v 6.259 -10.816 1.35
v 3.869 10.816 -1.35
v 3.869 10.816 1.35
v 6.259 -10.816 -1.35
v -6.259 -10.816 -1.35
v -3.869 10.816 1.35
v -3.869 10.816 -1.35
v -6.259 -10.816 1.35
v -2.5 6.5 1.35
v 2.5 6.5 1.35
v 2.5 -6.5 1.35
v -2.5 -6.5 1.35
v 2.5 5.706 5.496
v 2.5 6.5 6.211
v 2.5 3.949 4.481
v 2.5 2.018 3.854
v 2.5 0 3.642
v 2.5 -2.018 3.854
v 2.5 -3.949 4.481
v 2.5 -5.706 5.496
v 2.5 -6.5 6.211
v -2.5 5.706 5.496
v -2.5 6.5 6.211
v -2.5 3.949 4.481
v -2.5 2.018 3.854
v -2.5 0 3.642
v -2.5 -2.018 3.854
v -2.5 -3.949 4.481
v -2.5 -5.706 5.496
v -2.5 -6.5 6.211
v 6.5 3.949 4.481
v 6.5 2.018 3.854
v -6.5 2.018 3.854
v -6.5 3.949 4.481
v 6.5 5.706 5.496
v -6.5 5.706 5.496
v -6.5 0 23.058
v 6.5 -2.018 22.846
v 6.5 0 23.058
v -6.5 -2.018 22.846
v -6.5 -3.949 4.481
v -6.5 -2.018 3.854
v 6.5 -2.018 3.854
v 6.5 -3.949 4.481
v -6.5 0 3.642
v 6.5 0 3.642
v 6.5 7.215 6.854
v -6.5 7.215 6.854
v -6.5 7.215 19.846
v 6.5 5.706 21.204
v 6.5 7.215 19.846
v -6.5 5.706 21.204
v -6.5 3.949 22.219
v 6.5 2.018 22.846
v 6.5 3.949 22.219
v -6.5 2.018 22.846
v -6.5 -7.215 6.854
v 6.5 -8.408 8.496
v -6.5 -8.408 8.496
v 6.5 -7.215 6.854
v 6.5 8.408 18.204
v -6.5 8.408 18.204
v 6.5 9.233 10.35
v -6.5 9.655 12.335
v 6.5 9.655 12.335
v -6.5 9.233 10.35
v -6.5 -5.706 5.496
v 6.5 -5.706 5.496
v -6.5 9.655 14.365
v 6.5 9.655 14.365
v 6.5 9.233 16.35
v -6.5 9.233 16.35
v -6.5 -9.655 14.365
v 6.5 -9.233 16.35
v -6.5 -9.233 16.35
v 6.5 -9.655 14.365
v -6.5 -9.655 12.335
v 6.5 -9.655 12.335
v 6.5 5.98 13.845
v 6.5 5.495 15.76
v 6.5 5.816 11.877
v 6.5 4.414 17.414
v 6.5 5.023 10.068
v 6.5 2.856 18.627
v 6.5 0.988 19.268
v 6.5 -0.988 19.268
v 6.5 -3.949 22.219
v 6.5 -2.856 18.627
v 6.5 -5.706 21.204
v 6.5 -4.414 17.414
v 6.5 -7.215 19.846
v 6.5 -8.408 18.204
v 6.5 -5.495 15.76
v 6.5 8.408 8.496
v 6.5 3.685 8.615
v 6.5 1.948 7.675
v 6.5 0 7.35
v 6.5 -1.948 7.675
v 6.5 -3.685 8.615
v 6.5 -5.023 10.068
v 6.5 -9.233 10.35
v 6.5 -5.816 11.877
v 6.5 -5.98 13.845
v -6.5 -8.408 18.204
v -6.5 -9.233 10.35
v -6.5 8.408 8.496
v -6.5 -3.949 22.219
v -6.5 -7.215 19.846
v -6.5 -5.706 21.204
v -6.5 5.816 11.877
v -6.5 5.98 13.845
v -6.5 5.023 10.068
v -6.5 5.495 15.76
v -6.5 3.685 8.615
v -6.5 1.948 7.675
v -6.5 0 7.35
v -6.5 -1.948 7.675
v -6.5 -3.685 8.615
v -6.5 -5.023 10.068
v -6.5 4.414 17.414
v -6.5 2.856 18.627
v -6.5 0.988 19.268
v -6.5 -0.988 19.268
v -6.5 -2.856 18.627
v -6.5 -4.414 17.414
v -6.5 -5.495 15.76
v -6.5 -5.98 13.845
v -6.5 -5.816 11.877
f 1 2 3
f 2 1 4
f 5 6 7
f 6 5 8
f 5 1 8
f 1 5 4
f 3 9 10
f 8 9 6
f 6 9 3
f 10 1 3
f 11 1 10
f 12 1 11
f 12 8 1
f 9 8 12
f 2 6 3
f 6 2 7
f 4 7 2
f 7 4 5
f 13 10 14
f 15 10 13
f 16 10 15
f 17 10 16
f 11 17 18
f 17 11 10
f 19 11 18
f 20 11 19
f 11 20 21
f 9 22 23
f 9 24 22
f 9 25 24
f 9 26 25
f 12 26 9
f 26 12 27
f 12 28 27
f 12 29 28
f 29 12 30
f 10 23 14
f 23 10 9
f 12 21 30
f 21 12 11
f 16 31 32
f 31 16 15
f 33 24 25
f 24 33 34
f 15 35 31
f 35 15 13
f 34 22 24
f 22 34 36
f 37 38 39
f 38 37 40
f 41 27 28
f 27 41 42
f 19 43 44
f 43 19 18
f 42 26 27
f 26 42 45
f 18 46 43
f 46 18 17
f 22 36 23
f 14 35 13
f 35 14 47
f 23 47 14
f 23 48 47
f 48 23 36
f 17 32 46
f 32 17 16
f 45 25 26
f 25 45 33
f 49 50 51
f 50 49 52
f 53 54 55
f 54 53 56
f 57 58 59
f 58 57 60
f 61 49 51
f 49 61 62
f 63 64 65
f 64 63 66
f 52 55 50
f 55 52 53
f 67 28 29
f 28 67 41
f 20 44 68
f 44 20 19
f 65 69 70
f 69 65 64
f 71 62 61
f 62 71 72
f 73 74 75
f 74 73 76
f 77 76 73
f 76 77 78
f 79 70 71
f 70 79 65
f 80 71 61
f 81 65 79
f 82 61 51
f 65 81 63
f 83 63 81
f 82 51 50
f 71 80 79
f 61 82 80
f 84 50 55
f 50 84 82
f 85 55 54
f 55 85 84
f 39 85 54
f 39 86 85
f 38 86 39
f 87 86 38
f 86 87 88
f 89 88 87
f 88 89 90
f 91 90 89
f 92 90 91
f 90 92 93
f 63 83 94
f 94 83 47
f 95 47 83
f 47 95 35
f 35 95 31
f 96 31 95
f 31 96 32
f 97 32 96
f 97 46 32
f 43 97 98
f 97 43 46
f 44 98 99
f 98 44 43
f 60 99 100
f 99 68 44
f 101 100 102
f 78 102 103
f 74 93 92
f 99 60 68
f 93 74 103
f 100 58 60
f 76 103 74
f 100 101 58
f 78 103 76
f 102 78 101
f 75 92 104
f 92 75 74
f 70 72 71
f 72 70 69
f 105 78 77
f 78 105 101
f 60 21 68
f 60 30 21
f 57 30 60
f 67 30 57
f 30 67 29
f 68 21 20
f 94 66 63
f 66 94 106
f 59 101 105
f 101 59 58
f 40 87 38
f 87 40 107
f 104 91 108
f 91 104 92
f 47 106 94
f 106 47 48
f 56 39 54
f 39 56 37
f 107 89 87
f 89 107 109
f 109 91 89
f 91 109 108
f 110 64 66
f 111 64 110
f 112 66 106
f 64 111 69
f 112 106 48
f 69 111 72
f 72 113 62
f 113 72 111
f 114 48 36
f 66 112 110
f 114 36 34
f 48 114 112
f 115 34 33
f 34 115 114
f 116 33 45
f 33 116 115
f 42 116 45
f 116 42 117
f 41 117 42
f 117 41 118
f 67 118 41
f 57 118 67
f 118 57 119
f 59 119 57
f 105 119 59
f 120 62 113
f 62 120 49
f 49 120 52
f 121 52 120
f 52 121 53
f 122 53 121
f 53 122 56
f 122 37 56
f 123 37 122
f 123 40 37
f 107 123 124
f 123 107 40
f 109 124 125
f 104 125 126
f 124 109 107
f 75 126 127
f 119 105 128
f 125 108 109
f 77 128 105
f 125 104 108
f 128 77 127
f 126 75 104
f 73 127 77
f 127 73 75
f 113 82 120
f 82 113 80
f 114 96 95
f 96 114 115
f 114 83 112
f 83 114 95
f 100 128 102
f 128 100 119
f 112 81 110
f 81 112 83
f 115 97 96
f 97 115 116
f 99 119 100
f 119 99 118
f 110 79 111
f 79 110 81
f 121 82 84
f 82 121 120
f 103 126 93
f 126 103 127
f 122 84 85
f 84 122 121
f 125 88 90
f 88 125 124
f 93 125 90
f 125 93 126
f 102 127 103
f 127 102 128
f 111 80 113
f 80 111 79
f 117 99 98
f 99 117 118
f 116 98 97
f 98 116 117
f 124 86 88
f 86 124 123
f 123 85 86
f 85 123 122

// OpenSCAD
joinfactor = 0.125;
goldenratio = 1.61803399;
grabfactor = 0.5;

gDoorWidth = 34.5;

gHangerWidth = gDoorWidth/goldenratio;
gHangerBase = gDoorWidth+grabfactor;
gHangerShortLength = gHangerBase;
gHangerLongLength = gHangerBase*goldenratio;

gGrooveWallHeight = 6;
gGrooveWallThickness = 3;
gGrooveLength =gHangerShortLength/goldenratio; 
gGrooveWide = gHangerWidth/goldenratio;
gGrooveSkinny = gGrooveWide/goldenratio;

gShoeThickness = (gGrooveWallHeight-gGrooveWallThickness)*0.9;

gStandoffHeight=6;
gStandoffThickness = 5;
gStandoffLength = 13;

//taperedGroove(gGrooveLength, gGrooveWide, gGrooveSkinny);
//doorHangerBase();

//shoeWithStandoff();
//verticalHoop();
horizontalHoop();

//===============================================
// Basic routiines
//===============================================

module trapezoid(base, top, height, thickness) 
{
linear_extrude(height=thickness, center=true, convexity=10, twist=0) 
polygon(
points=[
[-base/2, -height/2], 
[base/2,-height/2],
[top/2, height/2],
[-top/2, height/2] 
],
paths=[[0,1,2,3]], 
convexity=10);
}

module taperedGroove(length, wide, skinny, 
	wallthickness=gGrooveWallThickness, wallheight=gGrooveWallHeight)
{
	a = (wide-skinny)/2;
	o = length;

	angle = atan2(a,o);
	grooveradius = wallthickness/2;

	union()
	{
		translate([wide/2, 0, 0])
		rotate([0, 0, angle])
		{
			cube(size=[wallthickness, length,wallheight ]);
			translate([0, 0, wallheight-grooveradius])
			rotate([-90, 0, 0])
			cylinder(r=grooveradius, h=length, $fn=12);
		}
	
		translate([-wide/2-wallthickness, 0, 0])
		rotate([0, 0, -angle])
		{
			cube(size=[wallthickness, length,wallheight ]);
			translate([wallthickness, 0, wallheight-grooveradius])
			rotate([-90, 0, 0])
			cylinder(r=grooveradius, h=length, $fn=12);
		}
	}
}

module doorHangerBase(doorwidth=34.5, hangerwidth = 34.5/goldenratio)
{
	grabfactor = 0.5;
	wallthickness = 3;

	hangerbase = doorwidth + grabfactor;
	hangershortlength = hangerbase;
	hangerlonglength = hangerbase*goldenratio;

	groovelength = hangershortlength/goldenratio;

	cube(size=[hangerbase+2*wallthickness, wallthickness, hangerwidth]);

	// short hangover
	translate([hangerbase+wallthickness, 0, 0])
	cube(size=[wallthickness, hangerbase+wallthickness, hangerwidth]);

	// Long hangover
	cube(size=[wallthickness, hangerlonglength+wallthickness, hangerwidth]);

	translate([joinfactor, hangerlonglength-groovelength, hangerwidth/2])
	rotate([0, -90, 0])
	taperedGroove(groovelength, gGrooveWide, gGrooveSkinny);

}

//===============================================
// Some attachments
//===============================================

module shoeWithStandoff()
{
	shoethickness = 3*0.9;


		union()
		{
			trapezoid(gGrooveWide*0.95, gGrooveSkinny*0.95, gGrooveLength,gShoeThickness);
		
			translate([0, 0, gShoeThickness/2+4/2-joinfactor])
			cube(size=[gStandoffThickness, gStandoffLength, gStandoffHeight+joinfactor ], center=true);		
		}
}

module verticalHoop()
{
	shoethickness = 3*0.9;

	standoffheight=6;
	standoffthickness = 5;

	eyeletIR = 12/2;
	eyeletOR = eyeletIR*goldenratio;
	eyeletLength = 13;

	difference()
	{
		union()
		{
			trapezoid(gGrooveWide*0.95, gGrooveSkinny*0.95, gGrooveLength, shoethickness);
		
			translate([0, 0, shoethickness/2+4/2-joinfactor])
			cube(size=[standoffthickness, eyeletLength, standoffheight+joinfactor ], center=true);
		
			translate([0, 0, eyeletOR+shoethickness/2+standoffheight-(eyeletOR-eyeletIR)])
			rotate([90, 0, 0])
			cylinder(r=eyeletOR, h=eyeletLength, center=true);
		}

		translate([0, 0, eyeletOR+shoethickness/2+standoffheight-(eyeletOR-eyeletIR)])
		rotate([90, 0, 0])
		cylinder(r=eyeletIR, h=eyeletLength+2*joinfactor, center=true);
	}
}

module horizontalHoop()
{
	shoethickness = 3*0.9;

	standoffheight=6;
	standoffthickness = 5;

	eyeletIR = 12/2;
	eyeletOR = eyeletIR*goldenratio;
	eyeletLength = 13;

	difference()
	{
		union()
		{
			shoeWithStandoff();
		
			translate([0, 0, eyeletOR+gShoeThickness/2+gStandoffHeight-(eyeletOR-eyeletIR)])
			rotate([0, 90, 0])
			cylinder(r=eyeletOR, h=eyeletLength, center=true);
		}

		translate([0, 0, eyeletOR+gShoeThickness/2+gStandoffHeight-(eyeletOR-eyeletIR)])
		rotate([0, 90, 0])
		cylinder(r=eyeletIR, h=eyeletLength+2*joinfactor, center=true);
	}
}
